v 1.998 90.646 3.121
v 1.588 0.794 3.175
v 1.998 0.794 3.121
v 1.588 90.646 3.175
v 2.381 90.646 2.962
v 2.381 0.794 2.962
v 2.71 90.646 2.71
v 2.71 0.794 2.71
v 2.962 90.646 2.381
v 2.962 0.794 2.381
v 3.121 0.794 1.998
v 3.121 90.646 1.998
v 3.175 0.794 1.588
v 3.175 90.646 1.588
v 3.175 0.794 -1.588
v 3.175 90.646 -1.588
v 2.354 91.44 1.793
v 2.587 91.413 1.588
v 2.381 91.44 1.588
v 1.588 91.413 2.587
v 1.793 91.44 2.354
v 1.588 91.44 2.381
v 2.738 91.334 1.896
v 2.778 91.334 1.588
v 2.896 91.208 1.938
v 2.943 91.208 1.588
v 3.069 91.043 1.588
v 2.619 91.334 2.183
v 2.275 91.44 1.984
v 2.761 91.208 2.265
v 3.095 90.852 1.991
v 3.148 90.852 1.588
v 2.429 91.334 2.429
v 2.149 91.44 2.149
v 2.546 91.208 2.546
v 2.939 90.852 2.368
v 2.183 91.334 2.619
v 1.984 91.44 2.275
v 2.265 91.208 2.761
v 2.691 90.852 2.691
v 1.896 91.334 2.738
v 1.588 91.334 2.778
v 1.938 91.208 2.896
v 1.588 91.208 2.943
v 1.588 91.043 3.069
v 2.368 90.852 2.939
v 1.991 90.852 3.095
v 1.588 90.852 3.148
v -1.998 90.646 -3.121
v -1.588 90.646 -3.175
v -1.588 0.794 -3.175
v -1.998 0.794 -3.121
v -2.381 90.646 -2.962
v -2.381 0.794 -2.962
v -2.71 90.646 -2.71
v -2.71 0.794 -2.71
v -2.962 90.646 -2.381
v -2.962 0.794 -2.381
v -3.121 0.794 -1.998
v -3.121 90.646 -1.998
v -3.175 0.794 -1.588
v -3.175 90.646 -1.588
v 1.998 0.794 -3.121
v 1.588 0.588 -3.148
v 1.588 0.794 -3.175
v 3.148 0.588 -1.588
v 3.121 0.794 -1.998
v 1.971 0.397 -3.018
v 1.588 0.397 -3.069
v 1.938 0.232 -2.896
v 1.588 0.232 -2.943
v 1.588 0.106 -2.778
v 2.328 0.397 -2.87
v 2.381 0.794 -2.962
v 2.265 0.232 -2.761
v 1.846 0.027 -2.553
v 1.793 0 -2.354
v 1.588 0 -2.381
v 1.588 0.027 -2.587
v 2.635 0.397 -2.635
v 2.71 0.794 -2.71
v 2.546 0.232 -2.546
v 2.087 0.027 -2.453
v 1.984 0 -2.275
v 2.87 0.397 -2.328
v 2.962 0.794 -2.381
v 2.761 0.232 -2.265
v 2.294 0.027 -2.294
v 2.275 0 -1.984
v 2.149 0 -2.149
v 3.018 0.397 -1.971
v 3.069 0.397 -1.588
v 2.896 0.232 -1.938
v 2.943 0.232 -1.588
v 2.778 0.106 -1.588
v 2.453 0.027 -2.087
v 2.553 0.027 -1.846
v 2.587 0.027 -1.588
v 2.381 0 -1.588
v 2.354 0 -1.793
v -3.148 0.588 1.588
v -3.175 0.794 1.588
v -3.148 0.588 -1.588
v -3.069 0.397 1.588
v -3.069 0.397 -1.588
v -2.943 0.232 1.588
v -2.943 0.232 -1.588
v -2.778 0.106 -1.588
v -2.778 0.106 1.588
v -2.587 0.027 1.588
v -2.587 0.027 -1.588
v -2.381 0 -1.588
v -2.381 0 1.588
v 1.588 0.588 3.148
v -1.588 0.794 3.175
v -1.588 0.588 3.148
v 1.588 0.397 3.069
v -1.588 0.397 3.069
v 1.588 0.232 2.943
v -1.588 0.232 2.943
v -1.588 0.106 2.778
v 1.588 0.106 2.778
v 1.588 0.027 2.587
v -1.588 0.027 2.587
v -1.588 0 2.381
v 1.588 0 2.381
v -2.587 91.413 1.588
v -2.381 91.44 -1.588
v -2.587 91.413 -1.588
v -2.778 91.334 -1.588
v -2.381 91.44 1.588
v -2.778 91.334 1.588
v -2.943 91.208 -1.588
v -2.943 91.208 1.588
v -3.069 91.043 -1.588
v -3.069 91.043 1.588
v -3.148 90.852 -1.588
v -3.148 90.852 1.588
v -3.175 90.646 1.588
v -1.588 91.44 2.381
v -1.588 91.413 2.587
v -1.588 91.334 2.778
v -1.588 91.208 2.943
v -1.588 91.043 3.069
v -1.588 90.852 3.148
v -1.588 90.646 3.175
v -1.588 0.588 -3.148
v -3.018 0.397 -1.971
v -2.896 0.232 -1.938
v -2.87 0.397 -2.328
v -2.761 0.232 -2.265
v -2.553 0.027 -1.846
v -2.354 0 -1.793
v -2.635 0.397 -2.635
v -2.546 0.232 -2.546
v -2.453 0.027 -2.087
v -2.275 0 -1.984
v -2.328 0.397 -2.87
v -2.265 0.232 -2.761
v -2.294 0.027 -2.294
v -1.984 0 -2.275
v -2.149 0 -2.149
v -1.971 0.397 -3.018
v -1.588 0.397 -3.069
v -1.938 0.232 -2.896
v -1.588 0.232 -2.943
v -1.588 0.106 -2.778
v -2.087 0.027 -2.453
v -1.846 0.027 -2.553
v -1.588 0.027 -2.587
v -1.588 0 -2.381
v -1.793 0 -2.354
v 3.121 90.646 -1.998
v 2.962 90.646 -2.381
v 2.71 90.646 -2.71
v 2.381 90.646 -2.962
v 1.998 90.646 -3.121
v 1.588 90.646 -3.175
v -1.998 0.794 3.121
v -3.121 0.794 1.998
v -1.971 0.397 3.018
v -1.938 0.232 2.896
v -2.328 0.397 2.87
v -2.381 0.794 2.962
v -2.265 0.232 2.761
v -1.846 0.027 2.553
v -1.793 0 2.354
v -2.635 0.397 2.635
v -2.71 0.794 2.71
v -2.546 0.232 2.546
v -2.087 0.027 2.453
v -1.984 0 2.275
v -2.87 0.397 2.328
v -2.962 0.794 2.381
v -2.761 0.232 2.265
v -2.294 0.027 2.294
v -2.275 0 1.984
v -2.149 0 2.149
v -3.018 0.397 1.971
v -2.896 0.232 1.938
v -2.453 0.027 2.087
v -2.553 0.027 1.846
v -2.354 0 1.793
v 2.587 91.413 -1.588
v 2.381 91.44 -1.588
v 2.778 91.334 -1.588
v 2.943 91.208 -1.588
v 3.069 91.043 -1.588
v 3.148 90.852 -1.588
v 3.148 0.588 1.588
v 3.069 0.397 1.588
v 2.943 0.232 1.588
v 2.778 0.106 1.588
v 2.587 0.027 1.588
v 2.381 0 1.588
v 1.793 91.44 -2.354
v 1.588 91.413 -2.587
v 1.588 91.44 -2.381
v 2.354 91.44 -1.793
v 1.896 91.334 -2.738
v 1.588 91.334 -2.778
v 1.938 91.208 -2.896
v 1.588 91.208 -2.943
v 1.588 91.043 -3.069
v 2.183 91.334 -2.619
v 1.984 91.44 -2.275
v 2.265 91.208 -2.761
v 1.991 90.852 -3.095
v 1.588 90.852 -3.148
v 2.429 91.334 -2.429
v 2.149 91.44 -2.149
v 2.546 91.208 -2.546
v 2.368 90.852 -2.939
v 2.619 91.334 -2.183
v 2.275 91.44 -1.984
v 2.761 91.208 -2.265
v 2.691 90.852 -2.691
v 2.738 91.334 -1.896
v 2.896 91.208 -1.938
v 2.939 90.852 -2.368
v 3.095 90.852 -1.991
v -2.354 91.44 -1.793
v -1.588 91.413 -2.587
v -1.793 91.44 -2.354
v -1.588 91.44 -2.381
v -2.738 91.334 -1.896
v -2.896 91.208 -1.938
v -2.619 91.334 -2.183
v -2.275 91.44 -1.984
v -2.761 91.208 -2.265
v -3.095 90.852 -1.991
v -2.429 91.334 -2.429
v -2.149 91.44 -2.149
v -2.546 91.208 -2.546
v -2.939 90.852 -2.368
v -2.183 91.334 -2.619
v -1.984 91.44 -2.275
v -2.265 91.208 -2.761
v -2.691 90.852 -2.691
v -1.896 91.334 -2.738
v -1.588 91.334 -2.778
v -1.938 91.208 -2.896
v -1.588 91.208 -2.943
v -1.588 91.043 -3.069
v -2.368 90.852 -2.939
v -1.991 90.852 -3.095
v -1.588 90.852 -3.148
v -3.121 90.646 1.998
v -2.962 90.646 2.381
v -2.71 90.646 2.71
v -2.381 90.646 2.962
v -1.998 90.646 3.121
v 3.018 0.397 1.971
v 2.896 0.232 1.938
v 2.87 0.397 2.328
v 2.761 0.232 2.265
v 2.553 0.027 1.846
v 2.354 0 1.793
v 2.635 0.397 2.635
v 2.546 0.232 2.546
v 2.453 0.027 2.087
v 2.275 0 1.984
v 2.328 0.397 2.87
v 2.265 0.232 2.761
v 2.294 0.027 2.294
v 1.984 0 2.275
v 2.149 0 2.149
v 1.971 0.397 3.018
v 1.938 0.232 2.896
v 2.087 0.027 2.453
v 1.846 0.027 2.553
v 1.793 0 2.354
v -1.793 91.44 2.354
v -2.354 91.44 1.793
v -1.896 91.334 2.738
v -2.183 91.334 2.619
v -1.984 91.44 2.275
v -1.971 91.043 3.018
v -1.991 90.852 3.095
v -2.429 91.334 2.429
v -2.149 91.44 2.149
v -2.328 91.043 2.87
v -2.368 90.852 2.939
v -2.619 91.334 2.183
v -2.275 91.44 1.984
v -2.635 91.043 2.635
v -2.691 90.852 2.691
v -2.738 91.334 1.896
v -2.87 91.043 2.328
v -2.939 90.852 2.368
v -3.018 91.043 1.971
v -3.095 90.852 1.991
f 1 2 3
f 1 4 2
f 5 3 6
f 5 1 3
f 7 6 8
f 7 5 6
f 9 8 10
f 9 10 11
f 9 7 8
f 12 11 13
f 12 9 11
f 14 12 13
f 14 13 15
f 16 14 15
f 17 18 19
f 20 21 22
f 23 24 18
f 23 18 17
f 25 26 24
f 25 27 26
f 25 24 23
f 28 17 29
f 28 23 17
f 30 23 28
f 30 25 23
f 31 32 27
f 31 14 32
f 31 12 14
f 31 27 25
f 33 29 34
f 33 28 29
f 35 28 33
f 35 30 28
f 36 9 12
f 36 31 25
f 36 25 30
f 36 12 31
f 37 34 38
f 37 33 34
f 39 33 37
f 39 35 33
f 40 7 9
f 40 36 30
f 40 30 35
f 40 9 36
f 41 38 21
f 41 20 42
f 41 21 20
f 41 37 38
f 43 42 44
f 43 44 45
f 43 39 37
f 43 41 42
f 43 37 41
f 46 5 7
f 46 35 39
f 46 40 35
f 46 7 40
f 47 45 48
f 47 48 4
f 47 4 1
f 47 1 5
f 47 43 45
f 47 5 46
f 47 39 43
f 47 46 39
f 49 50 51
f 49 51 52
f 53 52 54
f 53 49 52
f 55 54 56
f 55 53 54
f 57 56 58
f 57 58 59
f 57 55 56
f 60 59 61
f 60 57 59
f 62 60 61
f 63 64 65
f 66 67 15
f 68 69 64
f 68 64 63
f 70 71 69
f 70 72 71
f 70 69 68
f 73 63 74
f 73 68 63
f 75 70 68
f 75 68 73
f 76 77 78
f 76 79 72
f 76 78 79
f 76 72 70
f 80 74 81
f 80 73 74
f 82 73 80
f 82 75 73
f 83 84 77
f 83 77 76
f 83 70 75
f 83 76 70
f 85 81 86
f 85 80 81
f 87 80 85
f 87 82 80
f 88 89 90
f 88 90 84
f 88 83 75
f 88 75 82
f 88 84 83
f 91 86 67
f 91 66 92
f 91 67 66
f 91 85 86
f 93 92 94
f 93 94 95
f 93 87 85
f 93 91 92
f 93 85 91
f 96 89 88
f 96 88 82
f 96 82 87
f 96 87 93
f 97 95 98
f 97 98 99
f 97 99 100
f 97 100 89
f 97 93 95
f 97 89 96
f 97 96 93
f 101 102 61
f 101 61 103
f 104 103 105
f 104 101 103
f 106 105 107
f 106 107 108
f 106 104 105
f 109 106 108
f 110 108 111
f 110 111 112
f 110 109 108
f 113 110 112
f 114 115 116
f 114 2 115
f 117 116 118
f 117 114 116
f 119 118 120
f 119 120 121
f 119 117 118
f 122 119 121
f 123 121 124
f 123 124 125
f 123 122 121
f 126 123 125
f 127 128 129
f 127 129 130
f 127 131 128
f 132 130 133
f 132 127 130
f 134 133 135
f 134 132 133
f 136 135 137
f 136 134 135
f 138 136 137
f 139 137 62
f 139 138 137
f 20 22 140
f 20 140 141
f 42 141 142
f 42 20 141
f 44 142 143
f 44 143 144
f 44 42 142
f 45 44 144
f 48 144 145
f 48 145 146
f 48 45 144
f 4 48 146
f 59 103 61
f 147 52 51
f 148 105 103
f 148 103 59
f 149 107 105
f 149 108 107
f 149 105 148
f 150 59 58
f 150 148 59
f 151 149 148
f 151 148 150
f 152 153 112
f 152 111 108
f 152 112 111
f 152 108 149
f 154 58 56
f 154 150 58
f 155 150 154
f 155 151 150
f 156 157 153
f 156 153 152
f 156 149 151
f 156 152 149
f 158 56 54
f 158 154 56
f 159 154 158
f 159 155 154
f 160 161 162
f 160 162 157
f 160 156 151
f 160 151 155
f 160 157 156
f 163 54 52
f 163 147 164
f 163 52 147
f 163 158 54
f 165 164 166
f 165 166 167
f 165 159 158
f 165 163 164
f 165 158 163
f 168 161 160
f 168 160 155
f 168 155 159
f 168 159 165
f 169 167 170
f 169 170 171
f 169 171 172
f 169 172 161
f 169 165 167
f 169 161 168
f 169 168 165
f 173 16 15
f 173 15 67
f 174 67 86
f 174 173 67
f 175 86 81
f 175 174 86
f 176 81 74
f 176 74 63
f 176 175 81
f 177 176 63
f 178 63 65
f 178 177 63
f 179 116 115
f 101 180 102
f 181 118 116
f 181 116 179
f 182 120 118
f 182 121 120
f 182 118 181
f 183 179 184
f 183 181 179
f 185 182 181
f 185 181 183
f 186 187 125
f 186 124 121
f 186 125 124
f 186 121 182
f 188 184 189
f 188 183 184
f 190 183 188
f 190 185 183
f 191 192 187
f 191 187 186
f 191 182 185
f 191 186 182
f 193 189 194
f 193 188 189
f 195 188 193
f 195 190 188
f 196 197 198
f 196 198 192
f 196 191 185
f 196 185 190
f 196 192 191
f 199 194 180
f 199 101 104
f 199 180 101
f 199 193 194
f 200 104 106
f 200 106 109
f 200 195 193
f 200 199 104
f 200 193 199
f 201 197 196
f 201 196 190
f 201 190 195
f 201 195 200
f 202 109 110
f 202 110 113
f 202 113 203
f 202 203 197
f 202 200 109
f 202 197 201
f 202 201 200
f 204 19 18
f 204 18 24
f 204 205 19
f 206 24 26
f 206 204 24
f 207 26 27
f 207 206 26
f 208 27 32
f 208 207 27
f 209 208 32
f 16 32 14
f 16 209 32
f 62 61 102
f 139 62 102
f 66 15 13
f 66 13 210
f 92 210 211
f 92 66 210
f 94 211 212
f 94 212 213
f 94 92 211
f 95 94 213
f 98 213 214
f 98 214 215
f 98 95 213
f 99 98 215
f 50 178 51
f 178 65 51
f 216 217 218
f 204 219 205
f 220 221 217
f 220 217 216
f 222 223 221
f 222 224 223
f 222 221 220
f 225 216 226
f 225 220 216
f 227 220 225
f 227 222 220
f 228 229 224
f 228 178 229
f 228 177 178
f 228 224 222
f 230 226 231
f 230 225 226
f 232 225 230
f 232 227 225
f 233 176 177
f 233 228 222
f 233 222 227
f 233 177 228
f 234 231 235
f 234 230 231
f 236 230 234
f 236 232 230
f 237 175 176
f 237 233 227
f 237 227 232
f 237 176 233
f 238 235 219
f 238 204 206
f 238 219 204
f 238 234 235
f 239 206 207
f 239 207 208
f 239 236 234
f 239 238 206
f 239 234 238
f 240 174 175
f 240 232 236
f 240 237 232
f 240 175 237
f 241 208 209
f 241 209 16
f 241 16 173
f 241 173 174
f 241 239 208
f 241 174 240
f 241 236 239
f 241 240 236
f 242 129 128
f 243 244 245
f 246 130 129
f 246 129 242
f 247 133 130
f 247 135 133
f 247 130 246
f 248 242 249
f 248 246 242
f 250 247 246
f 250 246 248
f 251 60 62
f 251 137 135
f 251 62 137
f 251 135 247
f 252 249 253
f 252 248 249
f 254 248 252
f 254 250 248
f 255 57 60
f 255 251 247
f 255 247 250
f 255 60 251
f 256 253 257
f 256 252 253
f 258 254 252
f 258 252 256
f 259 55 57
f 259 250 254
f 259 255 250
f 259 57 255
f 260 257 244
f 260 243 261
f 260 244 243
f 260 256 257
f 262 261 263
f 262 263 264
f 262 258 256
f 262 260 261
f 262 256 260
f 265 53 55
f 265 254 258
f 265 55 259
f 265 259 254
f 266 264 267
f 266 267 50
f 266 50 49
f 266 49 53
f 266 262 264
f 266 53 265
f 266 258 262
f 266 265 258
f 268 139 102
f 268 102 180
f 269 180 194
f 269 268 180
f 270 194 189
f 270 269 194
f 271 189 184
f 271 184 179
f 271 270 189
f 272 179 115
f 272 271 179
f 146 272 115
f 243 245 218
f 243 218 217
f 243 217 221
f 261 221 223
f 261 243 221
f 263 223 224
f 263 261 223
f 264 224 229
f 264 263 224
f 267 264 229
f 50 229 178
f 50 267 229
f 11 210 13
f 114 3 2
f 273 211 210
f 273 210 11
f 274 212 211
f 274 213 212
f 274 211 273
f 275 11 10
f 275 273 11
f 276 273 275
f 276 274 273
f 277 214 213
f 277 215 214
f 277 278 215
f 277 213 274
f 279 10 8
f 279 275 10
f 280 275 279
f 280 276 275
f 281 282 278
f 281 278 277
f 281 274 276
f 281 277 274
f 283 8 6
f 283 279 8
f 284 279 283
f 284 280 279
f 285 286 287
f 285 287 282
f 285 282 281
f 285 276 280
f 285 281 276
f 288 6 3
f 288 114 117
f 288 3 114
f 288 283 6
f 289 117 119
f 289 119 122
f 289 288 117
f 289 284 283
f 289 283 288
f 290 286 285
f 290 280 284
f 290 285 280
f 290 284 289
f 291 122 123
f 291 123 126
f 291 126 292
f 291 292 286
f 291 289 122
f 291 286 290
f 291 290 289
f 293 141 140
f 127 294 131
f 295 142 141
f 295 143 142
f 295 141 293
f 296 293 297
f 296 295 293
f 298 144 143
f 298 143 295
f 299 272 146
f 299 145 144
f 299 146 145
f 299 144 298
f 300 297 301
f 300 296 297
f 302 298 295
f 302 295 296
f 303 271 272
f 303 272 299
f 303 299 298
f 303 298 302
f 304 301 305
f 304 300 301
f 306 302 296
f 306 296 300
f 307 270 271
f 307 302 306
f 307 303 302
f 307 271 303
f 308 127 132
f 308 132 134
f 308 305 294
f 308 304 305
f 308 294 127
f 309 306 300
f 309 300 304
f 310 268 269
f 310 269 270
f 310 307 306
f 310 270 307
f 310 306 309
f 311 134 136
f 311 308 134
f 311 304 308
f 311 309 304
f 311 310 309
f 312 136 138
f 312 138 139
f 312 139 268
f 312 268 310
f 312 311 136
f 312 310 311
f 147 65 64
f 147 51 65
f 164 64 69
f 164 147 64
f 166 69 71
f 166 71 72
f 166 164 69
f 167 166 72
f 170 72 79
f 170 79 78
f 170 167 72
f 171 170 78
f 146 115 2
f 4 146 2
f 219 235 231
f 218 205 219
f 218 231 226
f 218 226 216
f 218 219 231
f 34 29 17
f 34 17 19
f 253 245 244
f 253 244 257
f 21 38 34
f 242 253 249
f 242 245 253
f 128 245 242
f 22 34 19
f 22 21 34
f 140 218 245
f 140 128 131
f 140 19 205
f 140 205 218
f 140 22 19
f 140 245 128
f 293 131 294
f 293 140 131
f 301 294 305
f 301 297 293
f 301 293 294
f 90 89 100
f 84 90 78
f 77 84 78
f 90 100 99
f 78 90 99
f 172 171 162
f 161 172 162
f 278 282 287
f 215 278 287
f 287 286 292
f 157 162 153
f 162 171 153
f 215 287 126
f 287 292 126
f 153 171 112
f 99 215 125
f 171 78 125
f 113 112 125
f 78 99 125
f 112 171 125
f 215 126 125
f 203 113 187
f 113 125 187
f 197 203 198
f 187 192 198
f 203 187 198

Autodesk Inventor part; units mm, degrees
ref_plane "YZ Plane" through (0, 0, 0) normal (1, 0, 0) x (0, 1, 0)
ref_plane "XZ Plane" through (0, 0, 0) normal (0, 1, 0) x (-1, 0, 0)
ref_plane "XY Plane" through (0, 0, 0) normal (0, 0, 1) x (1, 0, 0)
sketch "Sketch1" plane through (0, 0, 0) normal (0, 1, 0) x (-1, 0, 0)
  line L0 (-3.175, -3.175) -> (3.175, -3.175)
  line L1 (3.175, -3.175) -> (3.175, 3.175)
  line L2 (3.175, 3.175) -> (-3.175, 3.175)
  line L3 (-3.175, 3.175) -> (-3.175, -3.175)
  line L4 (-3.175, -3.175) -> (3.175, 3.175) construction
  line L5 (3.175, -3.175) -> (-3.175, 3.175) construction
  point P0 (0, 0)
  dimension "d2" = 6.35
  dimension "d3" = 6.35
extrude "Extrusion1" add sketch "Sketch1" along normal blind 91.44
fillet "Fillet1" radius 1.5875 4 edges at (3.175, 45.72, 3.175) (3.175, 45.72, -3.175) (-3.175, 45.72, -3.175) (-3.175, 45.72, 3.175)
fillet "Fillet2" radius 0.7937 16 edges at (3.175, 0, 0) (2.71, 0, -2.71) (0, 0, -3.175) (-2.71, 0, -2.71) (-3.175, 0, 0) (-2.71, 0, 2.71) (0, 0, 3.175) (2.71, 0, 2.71) (0, 91.44, 3.175) (-2.71, 91.44, 2.71) (-3.175, 91.44, 0) (-2.71, 91.44, -2.71) (0, 91.44, -3.175) (2.71, 91.44, -2.71) (3.175, 91.44, 0) (2.71, 91.44, 2.71)
properties part number "wedgea" material "Stainless Steel"
